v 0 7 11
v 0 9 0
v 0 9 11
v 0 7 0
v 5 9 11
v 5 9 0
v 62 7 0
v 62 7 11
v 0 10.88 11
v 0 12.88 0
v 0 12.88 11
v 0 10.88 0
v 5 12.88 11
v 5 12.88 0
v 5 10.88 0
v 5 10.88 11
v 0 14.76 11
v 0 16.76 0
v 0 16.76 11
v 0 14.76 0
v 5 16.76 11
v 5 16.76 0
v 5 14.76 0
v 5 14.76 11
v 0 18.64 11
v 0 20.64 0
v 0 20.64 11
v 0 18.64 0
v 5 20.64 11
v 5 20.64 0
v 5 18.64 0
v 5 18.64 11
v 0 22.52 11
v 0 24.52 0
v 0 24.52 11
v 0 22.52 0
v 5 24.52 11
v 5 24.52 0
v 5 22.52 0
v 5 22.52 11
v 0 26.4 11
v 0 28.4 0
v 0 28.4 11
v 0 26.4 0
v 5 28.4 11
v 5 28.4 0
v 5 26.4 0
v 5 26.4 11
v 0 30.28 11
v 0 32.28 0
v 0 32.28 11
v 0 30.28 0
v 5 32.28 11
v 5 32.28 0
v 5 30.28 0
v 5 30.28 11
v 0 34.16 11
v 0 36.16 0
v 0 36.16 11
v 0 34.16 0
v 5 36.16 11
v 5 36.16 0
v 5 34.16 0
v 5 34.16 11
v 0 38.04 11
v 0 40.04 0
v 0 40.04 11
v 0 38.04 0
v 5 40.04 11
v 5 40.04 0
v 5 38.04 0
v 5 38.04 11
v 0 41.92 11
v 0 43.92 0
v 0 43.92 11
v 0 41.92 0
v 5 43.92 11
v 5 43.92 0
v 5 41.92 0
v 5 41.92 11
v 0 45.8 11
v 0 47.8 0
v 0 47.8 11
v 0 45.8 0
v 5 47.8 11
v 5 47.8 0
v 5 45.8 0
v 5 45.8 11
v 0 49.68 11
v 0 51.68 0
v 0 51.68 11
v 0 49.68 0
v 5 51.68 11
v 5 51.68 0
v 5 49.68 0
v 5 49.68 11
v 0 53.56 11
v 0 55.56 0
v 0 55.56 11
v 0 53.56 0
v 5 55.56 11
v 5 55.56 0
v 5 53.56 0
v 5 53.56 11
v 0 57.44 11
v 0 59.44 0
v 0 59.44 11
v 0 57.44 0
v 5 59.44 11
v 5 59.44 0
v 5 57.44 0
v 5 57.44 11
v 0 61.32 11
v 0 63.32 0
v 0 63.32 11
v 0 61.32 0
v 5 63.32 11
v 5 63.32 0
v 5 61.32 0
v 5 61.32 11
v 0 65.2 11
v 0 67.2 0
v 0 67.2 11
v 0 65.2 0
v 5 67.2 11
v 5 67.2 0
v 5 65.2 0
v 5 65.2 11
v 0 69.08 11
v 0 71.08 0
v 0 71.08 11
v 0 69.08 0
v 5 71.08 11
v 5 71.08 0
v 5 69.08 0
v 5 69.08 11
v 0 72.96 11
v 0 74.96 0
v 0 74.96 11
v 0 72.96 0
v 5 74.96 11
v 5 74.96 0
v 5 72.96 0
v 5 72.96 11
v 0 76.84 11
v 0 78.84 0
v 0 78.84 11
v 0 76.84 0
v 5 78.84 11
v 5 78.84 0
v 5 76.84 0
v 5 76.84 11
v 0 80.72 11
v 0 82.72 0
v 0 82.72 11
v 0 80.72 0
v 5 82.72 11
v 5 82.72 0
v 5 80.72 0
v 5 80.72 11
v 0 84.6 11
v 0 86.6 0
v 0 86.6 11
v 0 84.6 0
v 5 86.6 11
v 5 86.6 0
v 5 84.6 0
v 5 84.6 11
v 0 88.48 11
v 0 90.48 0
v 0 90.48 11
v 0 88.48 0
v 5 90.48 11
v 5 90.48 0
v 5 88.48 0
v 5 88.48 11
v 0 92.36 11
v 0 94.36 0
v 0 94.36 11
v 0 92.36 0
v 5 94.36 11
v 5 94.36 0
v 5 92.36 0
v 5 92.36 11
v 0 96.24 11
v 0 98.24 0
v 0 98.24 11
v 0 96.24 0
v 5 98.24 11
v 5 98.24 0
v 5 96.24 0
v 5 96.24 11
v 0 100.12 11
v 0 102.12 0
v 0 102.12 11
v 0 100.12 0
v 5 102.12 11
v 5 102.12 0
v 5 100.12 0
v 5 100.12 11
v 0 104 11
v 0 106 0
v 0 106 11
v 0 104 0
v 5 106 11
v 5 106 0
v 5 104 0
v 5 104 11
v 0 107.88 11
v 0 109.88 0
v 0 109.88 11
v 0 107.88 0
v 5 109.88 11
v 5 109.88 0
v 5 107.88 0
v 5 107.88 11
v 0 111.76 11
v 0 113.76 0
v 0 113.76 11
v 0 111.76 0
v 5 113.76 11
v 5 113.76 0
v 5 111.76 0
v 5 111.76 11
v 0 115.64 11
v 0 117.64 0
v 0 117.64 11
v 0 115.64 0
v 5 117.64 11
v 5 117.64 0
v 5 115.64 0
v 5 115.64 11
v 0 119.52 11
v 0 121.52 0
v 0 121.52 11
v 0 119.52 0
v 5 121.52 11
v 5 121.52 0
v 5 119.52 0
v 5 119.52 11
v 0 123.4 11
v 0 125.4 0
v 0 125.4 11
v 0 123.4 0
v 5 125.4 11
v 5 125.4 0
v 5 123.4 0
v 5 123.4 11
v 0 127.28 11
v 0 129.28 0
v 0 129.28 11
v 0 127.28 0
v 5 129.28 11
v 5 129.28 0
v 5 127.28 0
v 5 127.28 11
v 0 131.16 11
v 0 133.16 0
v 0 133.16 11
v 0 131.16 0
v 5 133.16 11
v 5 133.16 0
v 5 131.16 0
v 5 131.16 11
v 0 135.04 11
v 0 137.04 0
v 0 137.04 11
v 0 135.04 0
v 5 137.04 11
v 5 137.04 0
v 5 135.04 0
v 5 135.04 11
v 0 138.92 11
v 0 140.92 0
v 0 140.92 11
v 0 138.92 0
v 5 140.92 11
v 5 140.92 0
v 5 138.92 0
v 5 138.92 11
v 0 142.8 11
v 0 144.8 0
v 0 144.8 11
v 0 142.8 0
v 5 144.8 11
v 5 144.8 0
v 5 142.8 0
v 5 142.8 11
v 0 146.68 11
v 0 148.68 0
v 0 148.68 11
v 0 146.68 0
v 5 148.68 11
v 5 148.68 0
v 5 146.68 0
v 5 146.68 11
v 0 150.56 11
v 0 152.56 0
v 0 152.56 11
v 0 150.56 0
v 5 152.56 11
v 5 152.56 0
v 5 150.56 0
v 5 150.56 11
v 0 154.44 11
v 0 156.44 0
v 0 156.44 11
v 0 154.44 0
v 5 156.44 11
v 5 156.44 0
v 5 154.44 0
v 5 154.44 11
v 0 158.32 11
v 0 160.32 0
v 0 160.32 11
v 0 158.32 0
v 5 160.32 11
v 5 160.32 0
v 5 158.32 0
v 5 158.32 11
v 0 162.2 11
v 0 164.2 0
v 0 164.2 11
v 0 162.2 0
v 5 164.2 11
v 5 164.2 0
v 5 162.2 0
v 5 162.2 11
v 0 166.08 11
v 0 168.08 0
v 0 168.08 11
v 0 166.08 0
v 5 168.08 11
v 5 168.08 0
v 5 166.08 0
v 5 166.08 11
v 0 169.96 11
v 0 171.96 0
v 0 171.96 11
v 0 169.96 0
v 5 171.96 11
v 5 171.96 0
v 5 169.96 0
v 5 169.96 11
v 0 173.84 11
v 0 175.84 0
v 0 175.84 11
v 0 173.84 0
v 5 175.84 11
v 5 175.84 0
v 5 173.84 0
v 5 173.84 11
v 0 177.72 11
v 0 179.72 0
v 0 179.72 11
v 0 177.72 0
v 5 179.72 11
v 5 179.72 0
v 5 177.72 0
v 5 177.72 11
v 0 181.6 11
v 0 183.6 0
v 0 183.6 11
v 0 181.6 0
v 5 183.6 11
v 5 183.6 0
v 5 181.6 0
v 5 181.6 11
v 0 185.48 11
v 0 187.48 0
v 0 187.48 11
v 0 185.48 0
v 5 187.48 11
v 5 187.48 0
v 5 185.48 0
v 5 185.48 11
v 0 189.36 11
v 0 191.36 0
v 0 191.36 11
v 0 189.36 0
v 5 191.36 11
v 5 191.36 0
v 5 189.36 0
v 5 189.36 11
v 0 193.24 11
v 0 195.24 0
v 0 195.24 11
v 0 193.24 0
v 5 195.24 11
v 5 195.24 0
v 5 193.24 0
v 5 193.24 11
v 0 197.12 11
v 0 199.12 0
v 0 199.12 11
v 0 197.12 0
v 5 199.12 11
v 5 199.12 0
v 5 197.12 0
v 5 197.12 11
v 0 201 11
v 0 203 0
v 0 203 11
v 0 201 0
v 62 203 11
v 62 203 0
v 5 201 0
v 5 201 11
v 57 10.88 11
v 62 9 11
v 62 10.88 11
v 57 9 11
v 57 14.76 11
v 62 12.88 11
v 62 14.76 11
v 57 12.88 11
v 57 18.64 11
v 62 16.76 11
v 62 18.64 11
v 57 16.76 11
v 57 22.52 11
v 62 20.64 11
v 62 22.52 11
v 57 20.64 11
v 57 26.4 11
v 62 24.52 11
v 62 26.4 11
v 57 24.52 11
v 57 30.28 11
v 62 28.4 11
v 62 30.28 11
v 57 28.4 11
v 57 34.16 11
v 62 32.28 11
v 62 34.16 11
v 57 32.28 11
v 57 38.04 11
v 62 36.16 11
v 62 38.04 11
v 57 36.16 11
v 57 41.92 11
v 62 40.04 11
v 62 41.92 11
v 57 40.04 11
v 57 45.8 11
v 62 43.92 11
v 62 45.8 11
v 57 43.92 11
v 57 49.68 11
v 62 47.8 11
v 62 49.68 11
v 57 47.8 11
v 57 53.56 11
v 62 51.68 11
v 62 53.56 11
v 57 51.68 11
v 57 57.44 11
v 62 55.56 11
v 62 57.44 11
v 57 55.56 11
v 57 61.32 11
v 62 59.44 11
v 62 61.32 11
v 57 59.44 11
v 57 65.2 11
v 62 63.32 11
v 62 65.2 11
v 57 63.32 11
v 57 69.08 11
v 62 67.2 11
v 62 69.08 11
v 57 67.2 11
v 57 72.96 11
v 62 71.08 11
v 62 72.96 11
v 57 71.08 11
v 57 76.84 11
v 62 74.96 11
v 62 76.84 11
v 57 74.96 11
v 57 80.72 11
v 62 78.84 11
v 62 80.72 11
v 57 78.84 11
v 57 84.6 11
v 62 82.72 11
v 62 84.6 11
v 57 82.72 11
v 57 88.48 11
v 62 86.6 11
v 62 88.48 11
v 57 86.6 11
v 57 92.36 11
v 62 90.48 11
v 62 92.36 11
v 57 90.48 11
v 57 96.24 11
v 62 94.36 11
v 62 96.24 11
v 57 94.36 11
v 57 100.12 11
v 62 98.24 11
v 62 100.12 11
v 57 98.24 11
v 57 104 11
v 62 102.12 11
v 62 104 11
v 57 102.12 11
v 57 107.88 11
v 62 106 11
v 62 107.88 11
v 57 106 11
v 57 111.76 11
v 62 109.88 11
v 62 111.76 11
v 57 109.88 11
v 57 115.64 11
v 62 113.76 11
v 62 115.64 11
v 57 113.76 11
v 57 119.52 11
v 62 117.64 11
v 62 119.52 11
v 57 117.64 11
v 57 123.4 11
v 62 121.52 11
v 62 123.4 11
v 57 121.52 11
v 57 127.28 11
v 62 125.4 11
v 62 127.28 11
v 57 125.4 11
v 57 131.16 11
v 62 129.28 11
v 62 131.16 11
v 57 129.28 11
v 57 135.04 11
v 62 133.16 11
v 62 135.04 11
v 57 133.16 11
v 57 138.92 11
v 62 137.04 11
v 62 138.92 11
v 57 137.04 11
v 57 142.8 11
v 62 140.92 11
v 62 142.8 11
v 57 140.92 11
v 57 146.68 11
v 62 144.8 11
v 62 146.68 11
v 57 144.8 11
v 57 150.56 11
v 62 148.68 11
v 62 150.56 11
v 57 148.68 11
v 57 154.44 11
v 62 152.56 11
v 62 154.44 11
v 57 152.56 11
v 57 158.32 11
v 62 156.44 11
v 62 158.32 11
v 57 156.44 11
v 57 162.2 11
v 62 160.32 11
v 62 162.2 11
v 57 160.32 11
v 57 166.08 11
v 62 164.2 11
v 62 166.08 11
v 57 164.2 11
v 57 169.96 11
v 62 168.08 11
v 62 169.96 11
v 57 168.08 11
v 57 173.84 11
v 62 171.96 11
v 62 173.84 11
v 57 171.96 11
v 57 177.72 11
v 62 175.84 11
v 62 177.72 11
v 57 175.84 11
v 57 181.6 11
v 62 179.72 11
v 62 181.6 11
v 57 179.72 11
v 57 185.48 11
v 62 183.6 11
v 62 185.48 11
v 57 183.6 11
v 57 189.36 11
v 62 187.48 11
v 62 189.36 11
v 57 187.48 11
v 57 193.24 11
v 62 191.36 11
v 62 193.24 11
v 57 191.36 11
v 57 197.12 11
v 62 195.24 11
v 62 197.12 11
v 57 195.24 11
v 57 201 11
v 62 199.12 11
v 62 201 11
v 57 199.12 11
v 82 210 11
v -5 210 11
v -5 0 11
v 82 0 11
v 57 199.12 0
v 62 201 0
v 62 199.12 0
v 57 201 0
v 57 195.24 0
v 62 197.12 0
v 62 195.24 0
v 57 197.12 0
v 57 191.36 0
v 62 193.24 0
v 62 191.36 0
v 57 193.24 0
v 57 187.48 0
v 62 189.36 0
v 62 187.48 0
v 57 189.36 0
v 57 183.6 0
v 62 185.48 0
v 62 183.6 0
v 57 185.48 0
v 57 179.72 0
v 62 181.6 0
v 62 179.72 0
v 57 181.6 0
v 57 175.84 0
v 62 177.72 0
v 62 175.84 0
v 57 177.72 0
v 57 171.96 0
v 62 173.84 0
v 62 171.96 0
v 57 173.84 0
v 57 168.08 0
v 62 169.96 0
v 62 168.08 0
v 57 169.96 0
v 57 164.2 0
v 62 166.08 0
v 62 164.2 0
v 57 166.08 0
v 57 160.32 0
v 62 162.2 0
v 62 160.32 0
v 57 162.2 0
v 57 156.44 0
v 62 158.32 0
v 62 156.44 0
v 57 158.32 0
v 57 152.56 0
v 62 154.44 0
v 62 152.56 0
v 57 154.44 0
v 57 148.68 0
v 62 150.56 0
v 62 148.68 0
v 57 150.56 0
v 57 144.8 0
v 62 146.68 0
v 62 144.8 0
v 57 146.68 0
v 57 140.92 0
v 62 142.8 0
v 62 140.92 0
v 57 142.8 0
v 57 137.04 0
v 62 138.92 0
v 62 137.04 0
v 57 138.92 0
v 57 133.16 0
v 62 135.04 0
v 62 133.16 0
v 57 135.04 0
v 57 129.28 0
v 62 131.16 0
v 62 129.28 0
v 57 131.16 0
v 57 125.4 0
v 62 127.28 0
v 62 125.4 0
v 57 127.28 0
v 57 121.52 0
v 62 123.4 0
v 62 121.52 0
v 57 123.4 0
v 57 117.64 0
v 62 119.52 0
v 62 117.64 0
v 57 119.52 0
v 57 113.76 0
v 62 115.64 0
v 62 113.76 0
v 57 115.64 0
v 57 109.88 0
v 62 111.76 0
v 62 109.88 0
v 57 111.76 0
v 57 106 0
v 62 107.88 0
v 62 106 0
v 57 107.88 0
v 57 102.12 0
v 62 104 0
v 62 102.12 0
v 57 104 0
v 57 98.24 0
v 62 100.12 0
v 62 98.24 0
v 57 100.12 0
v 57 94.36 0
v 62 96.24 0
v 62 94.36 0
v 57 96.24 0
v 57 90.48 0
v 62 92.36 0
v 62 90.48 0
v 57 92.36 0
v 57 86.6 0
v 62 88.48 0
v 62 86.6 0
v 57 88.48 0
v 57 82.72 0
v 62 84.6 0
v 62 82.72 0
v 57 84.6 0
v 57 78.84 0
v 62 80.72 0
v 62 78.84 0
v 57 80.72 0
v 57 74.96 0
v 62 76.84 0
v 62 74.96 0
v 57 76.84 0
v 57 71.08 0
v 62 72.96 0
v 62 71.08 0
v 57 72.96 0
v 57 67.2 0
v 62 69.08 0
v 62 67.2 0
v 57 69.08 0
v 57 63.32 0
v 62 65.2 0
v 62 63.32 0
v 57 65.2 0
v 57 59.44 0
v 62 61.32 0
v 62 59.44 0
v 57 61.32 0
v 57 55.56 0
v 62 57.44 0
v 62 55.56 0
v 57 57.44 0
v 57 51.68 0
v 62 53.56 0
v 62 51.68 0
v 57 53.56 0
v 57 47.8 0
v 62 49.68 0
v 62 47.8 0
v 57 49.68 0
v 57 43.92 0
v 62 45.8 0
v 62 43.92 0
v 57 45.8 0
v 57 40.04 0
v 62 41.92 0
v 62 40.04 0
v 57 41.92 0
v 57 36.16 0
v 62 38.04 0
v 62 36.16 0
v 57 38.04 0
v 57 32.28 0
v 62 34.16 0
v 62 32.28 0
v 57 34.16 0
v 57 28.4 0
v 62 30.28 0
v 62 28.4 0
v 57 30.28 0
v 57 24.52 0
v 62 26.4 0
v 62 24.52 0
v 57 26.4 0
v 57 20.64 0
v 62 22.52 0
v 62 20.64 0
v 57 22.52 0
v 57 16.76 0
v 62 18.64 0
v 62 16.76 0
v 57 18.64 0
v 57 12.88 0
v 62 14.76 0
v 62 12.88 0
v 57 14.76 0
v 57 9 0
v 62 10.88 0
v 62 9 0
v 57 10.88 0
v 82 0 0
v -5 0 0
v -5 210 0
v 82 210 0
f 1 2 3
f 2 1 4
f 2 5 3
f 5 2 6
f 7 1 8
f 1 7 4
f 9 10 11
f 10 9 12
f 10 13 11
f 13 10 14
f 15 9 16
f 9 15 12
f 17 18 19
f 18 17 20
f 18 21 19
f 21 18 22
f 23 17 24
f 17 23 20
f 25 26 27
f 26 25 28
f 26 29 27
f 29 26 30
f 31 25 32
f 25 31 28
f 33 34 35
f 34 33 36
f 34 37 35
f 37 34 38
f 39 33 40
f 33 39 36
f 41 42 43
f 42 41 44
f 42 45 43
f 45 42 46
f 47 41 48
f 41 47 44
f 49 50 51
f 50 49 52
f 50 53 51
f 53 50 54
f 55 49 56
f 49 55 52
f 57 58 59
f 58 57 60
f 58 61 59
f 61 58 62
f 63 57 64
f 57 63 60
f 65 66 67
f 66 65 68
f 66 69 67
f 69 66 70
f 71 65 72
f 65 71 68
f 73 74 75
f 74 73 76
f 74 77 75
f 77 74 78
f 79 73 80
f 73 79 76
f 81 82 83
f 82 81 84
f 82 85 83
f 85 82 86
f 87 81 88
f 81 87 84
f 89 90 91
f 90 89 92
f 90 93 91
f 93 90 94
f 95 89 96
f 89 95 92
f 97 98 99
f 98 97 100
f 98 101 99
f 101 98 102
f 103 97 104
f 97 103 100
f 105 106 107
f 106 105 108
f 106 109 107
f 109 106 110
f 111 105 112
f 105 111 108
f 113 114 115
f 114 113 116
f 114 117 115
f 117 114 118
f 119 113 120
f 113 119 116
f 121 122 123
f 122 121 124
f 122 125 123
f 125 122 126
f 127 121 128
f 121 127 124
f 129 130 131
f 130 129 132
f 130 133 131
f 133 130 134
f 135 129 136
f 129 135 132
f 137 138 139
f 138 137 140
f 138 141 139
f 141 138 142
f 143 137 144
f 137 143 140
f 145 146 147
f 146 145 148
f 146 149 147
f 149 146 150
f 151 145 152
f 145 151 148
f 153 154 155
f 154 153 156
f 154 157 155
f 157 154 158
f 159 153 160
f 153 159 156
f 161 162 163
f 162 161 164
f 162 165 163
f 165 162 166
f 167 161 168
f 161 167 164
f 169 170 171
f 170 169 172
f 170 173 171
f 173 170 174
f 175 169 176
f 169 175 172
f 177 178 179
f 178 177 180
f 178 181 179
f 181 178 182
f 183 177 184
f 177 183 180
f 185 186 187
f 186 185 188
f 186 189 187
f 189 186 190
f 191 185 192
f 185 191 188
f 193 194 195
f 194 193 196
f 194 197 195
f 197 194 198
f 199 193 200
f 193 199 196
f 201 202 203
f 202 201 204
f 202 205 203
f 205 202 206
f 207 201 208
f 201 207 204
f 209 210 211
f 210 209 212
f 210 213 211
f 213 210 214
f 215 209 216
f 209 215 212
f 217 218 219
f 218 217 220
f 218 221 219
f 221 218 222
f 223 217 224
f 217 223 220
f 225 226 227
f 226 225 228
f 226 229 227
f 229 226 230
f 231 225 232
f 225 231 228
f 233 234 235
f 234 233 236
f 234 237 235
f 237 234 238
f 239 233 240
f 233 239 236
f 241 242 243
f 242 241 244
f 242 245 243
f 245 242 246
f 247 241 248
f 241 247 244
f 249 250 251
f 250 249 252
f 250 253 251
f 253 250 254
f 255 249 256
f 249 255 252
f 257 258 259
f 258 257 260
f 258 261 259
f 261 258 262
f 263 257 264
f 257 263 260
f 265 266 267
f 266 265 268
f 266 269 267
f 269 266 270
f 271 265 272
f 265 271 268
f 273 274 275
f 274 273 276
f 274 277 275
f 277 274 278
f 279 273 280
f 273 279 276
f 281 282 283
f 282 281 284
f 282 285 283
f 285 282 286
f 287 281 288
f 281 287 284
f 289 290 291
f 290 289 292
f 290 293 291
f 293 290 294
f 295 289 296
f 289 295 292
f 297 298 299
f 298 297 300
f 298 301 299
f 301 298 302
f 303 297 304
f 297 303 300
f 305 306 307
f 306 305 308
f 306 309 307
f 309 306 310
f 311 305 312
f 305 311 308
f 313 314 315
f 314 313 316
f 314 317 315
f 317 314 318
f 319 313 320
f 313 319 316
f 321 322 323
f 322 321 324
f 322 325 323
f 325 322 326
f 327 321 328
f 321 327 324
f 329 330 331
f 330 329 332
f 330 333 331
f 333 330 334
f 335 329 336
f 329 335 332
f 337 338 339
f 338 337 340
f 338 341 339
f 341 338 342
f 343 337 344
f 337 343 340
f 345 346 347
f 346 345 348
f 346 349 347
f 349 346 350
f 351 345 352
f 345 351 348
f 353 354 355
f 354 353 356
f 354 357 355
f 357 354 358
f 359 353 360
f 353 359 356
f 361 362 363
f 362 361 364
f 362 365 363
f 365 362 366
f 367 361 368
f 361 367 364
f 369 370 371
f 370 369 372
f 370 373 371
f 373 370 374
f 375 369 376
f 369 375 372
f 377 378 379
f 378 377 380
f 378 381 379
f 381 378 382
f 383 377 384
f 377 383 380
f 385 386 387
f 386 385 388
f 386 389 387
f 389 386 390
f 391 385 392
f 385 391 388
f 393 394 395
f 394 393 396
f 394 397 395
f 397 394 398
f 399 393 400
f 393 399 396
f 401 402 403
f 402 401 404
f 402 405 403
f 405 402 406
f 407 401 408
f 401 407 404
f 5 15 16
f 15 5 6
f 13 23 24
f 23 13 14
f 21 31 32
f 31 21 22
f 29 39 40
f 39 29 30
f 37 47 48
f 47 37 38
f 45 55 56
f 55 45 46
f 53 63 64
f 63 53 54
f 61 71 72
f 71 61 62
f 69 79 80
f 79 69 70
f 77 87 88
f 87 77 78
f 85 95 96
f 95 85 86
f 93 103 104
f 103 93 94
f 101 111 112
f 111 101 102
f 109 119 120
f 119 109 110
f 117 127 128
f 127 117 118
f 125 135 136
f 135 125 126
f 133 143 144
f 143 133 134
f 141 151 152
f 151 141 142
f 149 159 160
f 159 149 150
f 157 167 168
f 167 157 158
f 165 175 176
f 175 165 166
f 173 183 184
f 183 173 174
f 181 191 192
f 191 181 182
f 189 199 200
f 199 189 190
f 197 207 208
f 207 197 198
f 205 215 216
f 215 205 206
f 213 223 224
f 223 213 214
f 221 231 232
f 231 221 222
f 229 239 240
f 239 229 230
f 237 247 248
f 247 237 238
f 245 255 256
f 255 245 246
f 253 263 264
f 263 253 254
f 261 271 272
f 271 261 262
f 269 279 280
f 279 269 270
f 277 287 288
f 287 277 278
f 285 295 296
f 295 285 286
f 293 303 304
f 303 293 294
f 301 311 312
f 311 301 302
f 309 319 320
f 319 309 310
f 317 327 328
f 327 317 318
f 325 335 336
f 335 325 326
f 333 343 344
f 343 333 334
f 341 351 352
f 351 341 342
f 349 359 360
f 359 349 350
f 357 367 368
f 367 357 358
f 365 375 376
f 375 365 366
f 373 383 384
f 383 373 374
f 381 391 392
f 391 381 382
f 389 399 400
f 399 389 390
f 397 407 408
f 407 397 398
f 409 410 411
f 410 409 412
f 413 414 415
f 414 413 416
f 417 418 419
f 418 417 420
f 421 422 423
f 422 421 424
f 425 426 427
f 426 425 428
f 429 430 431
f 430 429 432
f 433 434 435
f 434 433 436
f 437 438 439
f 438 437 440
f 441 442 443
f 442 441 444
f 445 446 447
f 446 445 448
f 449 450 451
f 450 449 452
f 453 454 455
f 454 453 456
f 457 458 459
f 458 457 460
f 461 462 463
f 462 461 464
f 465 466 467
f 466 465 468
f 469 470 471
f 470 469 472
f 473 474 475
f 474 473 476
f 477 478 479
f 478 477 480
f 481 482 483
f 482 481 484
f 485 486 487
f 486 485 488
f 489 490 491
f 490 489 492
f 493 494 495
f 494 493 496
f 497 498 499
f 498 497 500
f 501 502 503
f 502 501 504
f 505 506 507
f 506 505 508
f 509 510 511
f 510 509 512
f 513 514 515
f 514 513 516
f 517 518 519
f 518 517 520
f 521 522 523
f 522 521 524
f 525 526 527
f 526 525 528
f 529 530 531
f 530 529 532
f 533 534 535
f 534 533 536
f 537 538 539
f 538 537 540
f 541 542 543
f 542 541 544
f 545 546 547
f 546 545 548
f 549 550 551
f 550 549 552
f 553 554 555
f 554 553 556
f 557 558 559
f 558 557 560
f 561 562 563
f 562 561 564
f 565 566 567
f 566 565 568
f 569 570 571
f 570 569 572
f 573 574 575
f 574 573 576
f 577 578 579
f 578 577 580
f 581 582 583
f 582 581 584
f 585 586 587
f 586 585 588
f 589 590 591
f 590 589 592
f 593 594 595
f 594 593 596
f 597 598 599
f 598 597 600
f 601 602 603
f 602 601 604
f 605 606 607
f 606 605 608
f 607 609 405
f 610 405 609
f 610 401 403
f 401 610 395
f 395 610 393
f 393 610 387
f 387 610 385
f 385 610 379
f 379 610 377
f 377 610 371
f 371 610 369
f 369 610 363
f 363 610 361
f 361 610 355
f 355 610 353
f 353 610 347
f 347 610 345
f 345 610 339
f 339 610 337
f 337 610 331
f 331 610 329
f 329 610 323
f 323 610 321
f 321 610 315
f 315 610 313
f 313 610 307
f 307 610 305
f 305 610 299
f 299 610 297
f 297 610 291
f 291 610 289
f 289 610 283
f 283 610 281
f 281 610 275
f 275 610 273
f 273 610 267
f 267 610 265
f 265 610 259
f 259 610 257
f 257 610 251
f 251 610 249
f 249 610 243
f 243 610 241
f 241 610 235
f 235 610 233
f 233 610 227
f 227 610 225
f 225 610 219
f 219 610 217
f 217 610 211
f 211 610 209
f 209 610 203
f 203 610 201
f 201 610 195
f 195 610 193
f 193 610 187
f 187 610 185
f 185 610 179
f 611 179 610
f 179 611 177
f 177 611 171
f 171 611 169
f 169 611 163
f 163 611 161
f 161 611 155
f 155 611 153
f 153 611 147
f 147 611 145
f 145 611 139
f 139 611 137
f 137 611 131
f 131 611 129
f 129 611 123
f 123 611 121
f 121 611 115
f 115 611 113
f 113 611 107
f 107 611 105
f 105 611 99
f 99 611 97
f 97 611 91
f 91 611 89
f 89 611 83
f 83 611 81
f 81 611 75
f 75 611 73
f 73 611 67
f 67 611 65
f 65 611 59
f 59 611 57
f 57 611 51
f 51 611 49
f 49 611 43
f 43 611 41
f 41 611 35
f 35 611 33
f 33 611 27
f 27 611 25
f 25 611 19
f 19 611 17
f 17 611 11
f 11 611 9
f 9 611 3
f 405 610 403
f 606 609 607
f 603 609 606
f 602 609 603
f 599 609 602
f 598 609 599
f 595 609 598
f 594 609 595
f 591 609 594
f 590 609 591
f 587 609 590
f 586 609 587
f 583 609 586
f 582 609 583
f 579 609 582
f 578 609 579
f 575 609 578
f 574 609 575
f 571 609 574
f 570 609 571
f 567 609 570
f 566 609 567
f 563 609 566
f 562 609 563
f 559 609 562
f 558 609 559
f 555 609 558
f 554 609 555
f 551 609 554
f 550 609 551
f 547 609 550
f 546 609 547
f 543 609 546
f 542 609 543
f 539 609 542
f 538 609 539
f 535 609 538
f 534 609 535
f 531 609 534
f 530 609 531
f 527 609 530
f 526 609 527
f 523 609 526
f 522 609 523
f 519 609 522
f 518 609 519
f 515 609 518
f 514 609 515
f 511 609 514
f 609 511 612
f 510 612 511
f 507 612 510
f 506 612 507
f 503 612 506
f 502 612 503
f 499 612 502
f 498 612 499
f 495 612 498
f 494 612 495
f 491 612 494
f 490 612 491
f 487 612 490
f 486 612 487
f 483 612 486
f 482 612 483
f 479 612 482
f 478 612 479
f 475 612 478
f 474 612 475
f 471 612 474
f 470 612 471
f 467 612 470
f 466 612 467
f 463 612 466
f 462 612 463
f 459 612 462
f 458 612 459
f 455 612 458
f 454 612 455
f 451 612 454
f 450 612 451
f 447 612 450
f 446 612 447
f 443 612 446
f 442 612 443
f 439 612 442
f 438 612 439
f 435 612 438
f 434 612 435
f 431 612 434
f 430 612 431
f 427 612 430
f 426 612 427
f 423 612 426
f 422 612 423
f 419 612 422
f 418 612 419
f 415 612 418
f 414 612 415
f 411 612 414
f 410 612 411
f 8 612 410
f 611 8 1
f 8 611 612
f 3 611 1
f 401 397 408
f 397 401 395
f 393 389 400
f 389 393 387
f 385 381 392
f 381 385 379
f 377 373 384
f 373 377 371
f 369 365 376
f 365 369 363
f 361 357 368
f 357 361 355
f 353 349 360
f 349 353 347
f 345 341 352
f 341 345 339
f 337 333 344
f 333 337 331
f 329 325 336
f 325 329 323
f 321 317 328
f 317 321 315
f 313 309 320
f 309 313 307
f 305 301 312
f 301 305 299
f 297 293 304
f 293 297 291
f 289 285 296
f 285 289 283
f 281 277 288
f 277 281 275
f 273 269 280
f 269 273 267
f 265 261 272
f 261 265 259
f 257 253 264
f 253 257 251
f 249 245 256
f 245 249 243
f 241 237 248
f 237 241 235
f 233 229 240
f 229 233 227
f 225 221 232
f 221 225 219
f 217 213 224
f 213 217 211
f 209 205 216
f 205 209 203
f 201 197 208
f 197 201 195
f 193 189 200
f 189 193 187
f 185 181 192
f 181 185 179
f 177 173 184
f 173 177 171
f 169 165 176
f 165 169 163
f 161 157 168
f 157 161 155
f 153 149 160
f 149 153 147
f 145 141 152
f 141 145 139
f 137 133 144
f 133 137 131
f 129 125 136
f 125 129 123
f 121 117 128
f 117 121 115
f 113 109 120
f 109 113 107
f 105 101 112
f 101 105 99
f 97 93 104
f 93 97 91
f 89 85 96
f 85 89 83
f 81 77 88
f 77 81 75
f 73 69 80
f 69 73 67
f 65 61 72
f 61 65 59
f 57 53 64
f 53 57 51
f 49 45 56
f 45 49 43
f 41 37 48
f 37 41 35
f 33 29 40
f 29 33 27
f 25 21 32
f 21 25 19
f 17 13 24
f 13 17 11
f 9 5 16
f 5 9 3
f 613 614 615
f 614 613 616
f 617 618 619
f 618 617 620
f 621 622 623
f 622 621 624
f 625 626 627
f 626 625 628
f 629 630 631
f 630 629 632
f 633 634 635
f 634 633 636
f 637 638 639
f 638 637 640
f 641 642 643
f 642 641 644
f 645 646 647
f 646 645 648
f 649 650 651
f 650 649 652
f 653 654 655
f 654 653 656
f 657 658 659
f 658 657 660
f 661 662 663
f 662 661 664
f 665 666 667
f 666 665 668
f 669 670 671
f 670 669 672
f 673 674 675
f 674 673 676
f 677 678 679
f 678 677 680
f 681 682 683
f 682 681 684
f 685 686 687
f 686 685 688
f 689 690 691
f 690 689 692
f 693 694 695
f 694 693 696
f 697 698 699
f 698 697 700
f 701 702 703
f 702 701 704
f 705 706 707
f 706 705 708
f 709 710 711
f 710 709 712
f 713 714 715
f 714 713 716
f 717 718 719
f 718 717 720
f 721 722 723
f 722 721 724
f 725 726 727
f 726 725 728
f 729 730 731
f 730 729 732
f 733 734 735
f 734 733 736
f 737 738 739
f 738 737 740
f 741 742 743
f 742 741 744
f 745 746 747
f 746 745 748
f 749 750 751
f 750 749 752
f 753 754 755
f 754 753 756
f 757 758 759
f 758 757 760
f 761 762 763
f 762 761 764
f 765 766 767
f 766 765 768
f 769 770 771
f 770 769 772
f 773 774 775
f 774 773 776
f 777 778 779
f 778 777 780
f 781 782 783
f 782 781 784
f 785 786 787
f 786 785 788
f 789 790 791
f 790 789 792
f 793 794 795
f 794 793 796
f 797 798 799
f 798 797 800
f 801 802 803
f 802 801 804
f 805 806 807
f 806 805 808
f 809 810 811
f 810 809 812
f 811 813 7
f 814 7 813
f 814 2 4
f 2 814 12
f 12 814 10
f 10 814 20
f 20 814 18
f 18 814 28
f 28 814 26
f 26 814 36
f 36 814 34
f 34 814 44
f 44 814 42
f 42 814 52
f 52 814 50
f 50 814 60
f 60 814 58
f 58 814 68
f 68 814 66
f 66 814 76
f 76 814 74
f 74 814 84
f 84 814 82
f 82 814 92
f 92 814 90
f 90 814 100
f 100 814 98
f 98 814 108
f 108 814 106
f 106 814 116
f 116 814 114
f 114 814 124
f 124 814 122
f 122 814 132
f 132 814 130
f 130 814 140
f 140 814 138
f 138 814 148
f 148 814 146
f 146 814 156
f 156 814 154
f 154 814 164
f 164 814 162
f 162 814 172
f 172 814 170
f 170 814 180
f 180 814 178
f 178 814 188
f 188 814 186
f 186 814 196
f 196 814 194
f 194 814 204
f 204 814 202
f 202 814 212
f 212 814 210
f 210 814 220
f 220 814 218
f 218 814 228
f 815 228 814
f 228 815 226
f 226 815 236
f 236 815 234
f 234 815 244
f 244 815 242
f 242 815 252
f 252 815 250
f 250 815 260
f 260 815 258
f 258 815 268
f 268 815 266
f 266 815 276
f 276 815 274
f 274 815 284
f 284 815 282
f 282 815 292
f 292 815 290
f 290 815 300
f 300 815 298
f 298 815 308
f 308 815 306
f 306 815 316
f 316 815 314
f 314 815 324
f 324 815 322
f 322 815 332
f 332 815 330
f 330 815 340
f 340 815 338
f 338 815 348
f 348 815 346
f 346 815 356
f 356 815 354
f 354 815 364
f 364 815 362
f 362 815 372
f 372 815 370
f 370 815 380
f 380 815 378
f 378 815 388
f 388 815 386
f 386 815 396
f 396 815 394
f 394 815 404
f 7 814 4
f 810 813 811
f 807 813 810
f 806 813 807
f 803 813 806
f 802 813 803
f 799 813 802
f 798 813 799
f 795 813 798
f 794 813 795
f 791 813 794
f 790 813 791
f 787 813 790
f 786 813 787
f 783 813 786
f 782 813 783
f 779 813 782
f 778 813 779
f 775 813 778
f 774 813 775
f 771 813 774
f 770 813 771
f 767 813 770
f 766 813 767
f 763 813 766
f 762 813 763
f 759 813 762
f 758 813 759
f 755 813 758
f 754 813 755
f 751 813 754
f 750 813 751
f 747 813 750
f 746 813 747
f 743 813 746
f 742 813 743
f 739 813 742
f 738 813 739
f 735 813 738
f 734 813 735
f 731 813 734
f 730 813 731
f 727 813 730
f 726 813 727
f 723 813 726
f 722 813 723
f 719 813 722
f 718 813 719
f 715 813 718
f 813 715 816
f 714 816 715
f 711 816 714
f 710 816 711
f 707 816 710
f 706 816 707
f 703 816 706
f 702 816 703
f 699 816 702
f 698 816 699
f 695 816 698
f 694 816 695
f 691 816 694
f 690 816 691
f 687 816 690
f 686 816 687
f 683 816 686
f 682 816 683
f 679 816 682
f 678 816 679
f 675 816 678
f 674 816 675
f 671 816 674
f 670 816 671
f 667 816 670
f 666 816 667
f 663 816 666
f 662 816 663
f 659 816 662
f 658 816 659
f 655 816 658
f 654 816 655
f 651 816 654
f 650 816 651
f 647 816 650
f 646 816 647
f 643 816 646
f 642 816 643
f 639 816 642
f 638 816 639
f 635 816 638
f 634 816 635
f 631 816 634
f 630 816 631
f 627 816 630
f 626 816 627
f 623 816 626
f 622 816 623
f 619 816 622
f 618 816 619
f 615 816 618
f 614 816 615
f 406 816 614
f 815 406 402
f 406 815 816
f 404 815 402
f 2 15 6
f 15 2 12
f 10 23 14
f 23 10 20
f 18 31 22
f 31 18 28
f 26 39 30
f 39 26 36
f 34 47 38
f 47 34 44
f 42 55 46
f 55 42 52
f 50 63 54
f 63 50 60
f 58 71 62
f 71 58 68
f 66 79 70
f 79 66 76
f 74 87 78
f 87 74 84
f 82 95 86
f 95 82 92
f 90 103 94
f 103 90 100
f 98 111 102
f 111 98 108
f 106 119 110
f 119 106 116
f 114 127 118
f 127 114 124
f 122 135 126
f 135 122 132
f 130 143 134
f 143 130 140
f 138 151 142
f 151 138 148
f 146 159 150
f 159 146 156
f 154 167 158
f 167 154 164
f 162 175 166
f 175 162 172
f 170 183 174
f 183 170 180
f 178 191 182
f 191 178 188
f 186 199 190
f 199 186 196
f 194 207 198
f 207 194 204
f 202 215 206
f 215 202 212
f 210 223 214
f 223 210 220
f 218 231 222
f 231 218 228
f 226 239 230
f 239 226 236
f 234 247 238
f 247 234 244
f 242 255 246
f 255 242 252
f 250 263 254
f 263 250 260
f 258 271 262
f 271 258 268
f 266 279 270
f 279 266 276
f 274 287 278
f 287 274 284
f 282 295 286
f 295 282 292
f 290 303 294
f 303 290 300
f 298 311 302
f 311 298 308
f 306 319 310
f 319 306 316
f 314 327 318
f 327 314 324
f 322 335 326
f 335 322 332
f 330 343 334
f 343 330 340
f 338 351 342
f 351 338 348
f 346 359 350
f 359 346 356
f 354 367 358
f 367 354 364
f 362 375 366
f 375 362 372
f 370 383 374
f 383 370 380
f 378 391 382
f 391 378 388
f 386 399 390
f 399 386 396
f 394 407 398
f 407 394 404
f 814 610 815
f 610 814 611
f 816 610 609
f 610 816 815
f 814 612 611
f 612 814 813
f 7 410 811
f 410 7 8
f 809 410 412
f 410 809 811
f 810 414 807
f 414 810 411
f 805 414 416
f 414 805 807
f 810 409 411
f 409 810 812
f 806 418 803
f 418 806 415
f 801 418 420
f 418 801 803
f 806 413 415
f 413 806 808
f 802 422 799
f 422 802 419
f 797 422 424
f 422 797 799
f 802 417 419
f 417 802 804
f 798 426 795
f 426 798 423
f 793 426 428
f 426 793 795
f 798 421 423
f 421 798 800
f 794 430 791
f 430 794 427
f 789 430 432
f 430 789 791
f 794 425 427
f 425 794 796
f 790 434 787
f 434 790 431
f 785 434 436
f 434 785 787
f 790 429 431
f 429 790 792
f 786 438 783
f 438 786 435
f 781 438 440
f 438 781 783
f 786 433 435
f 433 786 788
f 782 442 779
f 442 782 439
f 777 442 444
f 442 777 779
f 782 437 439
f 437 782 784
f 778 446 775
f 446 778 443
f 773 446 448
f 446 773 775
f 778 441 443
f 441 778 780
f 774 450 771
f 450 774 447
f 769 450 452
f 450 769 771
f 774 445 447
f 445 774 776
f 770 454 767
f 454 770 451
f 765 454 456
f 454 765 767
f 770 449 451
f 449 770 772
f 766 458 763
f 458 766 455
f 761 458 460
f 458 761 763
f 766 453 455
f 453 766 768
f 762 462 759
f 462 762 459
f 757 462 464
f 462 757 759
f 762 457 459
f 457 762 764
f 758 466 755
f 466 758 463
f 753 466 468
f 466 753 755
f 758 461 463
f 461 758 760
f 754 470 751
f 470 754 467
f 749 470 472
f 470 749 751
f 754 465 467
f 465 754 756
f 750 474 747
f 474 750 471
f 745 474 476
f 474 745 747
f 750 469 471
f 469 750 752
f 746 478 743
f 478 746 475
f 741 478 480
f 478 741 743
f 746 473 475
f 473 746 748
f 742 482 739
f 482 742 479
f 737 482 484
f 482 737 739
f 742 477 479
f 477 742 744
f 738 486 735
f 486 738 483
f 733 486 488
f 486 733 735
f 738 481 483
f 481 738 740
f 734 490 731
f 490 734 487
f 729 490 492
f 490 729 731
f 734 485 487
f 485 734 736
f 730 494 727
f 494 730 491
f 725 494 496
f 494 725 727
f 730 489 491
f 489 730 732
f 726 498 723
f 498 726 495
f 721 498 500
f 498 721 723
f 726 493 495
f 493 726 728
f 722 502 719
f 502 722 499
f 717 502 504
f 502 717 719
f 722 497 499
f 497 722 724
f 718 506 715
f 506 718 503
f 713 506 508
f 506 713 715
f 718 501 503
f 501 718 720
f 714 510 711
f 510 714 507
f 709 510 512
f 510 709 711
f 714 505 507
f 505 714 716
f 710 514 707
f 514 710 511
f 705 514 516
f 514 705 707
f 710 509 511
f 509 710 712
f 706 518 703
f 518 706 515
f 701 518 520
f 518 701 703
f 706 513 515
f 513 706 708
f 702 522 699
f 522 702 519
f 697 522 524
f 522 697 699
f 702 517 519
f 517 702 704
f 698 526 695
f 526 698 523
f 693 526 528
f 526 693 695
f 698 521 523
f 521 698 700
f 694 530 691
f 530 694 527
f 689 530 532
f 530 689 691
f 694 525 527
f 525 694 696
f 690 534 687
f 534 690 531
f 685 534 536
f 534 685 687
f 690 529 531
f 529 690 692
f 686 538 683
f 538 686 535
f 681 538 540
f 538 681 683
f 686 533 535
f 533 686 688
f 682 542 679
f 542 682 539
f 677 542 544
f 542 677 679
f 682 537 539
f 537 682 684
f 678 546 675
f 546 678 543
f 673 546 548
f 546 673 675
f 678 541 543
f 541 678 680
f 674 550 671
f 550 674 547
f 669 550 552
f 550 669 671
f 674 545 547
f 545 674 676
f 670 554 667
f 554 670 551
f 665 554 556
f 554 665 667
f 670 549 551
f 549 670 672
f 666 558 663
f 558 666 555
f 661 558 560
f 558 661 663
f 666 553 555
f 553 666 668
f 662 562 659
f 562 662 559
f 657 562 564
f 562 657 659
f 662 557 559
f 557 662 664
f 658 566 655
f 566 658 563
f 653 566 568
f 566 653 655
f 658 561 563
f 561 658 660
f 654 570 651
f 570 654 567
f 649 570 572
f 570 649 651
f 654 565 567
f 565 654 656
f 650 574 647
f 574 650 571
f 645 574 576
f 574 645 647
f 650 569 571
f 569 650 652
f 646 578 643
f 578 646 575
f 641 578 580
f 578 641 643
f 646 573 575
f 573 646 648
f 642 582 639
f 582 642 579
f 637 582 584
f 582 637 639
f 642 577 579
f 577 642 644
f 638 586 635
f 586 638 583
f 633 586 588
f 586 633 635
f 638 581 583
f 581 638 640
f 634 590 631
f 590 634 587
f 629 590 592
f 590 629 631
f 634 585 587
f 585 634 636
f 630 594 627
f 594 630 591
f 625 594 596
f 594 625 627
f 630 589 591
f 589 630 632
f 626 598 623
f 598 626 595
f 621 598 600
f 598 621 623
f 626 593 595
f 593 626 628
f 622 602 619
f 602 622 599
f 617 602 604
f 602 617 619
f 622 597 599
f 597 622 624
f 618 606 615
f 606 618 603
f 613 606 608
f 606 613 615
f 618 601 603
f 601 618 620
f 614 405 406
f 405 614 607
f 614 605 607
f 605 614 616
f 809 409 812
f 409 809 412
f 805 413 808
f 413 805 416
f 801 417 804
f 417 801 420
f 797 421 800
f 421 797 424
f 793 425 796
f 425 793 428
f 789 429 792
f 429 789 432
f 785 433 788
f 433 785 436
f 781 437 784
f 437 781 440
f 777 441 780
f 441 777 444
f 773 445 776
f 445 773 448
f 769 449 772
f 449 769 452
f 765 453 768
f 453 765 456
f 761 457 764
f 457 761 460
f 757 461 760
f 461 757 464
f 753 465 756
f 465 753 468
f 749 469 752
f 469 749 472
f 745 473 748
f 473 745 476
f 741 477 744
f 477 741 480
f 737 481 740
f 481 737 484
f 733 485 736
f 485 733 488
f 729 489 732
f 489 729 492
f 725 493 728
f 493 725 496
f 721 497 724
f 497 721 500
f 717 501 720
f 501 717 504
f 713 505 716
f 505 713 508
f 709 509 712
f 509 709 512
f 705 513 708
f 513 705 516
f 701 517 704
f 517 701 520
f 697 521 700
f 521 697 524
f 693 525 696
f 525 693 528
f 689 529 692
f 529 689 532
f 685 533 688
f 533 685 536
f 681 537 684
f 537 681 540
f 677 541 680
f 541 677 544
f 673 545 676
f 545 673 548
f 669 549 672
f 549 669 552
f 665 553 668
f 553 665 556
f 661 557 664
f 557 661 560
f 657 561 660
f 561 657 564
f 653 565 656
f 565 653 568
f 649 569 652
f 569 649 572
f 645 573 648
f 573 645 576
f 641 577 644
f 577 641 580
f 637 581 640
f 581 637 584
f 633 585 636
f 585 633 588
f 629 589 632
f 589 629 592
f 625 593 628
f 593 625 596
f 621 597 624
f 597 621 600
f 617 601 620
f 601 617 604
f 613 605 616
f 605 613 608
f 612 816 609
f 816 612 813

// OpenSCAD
// 21cm 88mm 11mm

translate([-5,0,0]) side();
translate([5+62,0,0]) mirror([1,0,0]) side();
cube([62,7,11]);
translate([0,203,0]) cube([62,7,11]);
translate([67,0,0]) cube([15,210,11]);

module side() {
difference() {
    cube([10,210,11]);
    union() {
        for(i=[0:50]) {
            translate([5,7+3.88*i,-0.5]) cube([6,2,12]);
        }
    }
}
}
